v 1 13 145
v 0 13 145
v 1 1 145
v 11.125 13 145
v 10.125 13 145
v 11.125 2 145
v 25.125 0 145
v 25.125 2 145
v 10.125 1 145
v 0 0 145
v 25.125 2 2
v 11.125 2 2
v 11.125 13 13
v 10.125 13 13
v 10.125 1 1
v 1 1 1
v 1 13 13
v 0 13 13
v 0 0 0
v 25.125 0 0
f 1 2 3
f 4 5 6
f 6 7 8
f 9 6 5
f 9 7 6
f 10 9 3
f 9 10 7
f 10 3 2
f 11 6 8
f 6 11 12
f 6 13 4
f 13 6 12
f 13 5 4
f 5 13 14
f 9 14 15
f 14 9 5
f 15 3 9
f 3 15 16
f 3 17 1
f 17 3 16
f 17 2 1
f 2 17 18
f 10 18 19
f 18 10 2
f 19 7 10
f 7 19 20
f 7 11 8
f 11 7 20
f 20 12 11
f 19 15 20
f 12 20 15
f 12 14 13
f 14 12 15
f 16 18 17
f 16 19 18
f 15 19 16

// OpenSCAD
// Global Constants
D = 0.125;
D2 = D * 2;
// Input Parameters
materialWidth = 9;
modelLength = 145;
wallThickness = 1;
wingSize = 12;
// Fence
fenceOn = true;
fenceHeight = 15;
fenceThickness = 2;
// Corner cuts
cornerCount = 1;
// Middle cut in the fence
middleCutOn = false;
middleCutWidth = 15;

// Selected module call
edge(materialWidth, modelLength, wallThickness, wingSize, fenceOn, fenceHeight, 
    fenceThickness, cornerCount, middleCutOn, middleCutWidth);

module edge(width, length, wall, wing, is_fence, f_height, f_thickness, corners,
    is_middle_cut, middle_cut_width) {
    if (corners == 0) {
        mainEdge(width, length, wall, wing, is_fence, f_height, f_thickness,
            is_middle_cut, middle_cut_width);
    } else if (corners == 1) {
        difference() {
            mainEdge(width, length, wall, wing, is_fence, f_height, f_thickness,
                is_middle_cut, middle_cut_width);
            rotate([-45, 0, 0]) 
                edgeCornerCube(width, wall, f_height, wing);
        }
    } else {
        difference() {
            mainEdge(width, length, wall, wing, is_fence, f_height, f_thickness,
                is_middle_cut, middle_cut_width);
            rotate([-45, 0, 0]) 
                edgeCornerCube(width, wall, f_height, wing);
            translate([0, 0, length]) 
                rotate([-45, 0, 0])
                    edgeCornerCube(width, wall, f_height, wing);
        }
    }
}

module edgeCornerCube(eWidth, eWall, eFHeight, eWing) {
    cube([eWidth + eWall + eFHeight + D, (eWing + eWall) * 2, (eWing + eWall) * 2]);
}
    
module mainEdge(width, length, wall, wing, is_fence, f_height, f_thickness,
                is_middle_cut, middle_cut_width) {
    difference() {
        linear_extrude(length) {
            polygon(points=[
                [0, 0], 
                [width + wall * 2 + D, 0], 
                [width + wall * 2 + D, wing + wall],
                [width + wall + D, wing + wall],
                [width + wall + D, wall],
                [wall, wall],
                [wall, wing + wall],
                [0, wing + wall]]);
            if (is_fence) {
                polygon(points=[
                    [width + wall + D, 0], 
                    [width + wall + D, f_thickness],
                    [width + wall + f_height + D, f_thickness],
                    [width + wall + f_height + D, 0],
                    ]);
            }
        }
        if (is_middle_cut) {
            translate([width + wall * 2 + D, 0, length/2 - middle_cut_width/2]) 
                cube([f_height, wall + f_height, middle_cut_width]);
        }
    }
    
}
